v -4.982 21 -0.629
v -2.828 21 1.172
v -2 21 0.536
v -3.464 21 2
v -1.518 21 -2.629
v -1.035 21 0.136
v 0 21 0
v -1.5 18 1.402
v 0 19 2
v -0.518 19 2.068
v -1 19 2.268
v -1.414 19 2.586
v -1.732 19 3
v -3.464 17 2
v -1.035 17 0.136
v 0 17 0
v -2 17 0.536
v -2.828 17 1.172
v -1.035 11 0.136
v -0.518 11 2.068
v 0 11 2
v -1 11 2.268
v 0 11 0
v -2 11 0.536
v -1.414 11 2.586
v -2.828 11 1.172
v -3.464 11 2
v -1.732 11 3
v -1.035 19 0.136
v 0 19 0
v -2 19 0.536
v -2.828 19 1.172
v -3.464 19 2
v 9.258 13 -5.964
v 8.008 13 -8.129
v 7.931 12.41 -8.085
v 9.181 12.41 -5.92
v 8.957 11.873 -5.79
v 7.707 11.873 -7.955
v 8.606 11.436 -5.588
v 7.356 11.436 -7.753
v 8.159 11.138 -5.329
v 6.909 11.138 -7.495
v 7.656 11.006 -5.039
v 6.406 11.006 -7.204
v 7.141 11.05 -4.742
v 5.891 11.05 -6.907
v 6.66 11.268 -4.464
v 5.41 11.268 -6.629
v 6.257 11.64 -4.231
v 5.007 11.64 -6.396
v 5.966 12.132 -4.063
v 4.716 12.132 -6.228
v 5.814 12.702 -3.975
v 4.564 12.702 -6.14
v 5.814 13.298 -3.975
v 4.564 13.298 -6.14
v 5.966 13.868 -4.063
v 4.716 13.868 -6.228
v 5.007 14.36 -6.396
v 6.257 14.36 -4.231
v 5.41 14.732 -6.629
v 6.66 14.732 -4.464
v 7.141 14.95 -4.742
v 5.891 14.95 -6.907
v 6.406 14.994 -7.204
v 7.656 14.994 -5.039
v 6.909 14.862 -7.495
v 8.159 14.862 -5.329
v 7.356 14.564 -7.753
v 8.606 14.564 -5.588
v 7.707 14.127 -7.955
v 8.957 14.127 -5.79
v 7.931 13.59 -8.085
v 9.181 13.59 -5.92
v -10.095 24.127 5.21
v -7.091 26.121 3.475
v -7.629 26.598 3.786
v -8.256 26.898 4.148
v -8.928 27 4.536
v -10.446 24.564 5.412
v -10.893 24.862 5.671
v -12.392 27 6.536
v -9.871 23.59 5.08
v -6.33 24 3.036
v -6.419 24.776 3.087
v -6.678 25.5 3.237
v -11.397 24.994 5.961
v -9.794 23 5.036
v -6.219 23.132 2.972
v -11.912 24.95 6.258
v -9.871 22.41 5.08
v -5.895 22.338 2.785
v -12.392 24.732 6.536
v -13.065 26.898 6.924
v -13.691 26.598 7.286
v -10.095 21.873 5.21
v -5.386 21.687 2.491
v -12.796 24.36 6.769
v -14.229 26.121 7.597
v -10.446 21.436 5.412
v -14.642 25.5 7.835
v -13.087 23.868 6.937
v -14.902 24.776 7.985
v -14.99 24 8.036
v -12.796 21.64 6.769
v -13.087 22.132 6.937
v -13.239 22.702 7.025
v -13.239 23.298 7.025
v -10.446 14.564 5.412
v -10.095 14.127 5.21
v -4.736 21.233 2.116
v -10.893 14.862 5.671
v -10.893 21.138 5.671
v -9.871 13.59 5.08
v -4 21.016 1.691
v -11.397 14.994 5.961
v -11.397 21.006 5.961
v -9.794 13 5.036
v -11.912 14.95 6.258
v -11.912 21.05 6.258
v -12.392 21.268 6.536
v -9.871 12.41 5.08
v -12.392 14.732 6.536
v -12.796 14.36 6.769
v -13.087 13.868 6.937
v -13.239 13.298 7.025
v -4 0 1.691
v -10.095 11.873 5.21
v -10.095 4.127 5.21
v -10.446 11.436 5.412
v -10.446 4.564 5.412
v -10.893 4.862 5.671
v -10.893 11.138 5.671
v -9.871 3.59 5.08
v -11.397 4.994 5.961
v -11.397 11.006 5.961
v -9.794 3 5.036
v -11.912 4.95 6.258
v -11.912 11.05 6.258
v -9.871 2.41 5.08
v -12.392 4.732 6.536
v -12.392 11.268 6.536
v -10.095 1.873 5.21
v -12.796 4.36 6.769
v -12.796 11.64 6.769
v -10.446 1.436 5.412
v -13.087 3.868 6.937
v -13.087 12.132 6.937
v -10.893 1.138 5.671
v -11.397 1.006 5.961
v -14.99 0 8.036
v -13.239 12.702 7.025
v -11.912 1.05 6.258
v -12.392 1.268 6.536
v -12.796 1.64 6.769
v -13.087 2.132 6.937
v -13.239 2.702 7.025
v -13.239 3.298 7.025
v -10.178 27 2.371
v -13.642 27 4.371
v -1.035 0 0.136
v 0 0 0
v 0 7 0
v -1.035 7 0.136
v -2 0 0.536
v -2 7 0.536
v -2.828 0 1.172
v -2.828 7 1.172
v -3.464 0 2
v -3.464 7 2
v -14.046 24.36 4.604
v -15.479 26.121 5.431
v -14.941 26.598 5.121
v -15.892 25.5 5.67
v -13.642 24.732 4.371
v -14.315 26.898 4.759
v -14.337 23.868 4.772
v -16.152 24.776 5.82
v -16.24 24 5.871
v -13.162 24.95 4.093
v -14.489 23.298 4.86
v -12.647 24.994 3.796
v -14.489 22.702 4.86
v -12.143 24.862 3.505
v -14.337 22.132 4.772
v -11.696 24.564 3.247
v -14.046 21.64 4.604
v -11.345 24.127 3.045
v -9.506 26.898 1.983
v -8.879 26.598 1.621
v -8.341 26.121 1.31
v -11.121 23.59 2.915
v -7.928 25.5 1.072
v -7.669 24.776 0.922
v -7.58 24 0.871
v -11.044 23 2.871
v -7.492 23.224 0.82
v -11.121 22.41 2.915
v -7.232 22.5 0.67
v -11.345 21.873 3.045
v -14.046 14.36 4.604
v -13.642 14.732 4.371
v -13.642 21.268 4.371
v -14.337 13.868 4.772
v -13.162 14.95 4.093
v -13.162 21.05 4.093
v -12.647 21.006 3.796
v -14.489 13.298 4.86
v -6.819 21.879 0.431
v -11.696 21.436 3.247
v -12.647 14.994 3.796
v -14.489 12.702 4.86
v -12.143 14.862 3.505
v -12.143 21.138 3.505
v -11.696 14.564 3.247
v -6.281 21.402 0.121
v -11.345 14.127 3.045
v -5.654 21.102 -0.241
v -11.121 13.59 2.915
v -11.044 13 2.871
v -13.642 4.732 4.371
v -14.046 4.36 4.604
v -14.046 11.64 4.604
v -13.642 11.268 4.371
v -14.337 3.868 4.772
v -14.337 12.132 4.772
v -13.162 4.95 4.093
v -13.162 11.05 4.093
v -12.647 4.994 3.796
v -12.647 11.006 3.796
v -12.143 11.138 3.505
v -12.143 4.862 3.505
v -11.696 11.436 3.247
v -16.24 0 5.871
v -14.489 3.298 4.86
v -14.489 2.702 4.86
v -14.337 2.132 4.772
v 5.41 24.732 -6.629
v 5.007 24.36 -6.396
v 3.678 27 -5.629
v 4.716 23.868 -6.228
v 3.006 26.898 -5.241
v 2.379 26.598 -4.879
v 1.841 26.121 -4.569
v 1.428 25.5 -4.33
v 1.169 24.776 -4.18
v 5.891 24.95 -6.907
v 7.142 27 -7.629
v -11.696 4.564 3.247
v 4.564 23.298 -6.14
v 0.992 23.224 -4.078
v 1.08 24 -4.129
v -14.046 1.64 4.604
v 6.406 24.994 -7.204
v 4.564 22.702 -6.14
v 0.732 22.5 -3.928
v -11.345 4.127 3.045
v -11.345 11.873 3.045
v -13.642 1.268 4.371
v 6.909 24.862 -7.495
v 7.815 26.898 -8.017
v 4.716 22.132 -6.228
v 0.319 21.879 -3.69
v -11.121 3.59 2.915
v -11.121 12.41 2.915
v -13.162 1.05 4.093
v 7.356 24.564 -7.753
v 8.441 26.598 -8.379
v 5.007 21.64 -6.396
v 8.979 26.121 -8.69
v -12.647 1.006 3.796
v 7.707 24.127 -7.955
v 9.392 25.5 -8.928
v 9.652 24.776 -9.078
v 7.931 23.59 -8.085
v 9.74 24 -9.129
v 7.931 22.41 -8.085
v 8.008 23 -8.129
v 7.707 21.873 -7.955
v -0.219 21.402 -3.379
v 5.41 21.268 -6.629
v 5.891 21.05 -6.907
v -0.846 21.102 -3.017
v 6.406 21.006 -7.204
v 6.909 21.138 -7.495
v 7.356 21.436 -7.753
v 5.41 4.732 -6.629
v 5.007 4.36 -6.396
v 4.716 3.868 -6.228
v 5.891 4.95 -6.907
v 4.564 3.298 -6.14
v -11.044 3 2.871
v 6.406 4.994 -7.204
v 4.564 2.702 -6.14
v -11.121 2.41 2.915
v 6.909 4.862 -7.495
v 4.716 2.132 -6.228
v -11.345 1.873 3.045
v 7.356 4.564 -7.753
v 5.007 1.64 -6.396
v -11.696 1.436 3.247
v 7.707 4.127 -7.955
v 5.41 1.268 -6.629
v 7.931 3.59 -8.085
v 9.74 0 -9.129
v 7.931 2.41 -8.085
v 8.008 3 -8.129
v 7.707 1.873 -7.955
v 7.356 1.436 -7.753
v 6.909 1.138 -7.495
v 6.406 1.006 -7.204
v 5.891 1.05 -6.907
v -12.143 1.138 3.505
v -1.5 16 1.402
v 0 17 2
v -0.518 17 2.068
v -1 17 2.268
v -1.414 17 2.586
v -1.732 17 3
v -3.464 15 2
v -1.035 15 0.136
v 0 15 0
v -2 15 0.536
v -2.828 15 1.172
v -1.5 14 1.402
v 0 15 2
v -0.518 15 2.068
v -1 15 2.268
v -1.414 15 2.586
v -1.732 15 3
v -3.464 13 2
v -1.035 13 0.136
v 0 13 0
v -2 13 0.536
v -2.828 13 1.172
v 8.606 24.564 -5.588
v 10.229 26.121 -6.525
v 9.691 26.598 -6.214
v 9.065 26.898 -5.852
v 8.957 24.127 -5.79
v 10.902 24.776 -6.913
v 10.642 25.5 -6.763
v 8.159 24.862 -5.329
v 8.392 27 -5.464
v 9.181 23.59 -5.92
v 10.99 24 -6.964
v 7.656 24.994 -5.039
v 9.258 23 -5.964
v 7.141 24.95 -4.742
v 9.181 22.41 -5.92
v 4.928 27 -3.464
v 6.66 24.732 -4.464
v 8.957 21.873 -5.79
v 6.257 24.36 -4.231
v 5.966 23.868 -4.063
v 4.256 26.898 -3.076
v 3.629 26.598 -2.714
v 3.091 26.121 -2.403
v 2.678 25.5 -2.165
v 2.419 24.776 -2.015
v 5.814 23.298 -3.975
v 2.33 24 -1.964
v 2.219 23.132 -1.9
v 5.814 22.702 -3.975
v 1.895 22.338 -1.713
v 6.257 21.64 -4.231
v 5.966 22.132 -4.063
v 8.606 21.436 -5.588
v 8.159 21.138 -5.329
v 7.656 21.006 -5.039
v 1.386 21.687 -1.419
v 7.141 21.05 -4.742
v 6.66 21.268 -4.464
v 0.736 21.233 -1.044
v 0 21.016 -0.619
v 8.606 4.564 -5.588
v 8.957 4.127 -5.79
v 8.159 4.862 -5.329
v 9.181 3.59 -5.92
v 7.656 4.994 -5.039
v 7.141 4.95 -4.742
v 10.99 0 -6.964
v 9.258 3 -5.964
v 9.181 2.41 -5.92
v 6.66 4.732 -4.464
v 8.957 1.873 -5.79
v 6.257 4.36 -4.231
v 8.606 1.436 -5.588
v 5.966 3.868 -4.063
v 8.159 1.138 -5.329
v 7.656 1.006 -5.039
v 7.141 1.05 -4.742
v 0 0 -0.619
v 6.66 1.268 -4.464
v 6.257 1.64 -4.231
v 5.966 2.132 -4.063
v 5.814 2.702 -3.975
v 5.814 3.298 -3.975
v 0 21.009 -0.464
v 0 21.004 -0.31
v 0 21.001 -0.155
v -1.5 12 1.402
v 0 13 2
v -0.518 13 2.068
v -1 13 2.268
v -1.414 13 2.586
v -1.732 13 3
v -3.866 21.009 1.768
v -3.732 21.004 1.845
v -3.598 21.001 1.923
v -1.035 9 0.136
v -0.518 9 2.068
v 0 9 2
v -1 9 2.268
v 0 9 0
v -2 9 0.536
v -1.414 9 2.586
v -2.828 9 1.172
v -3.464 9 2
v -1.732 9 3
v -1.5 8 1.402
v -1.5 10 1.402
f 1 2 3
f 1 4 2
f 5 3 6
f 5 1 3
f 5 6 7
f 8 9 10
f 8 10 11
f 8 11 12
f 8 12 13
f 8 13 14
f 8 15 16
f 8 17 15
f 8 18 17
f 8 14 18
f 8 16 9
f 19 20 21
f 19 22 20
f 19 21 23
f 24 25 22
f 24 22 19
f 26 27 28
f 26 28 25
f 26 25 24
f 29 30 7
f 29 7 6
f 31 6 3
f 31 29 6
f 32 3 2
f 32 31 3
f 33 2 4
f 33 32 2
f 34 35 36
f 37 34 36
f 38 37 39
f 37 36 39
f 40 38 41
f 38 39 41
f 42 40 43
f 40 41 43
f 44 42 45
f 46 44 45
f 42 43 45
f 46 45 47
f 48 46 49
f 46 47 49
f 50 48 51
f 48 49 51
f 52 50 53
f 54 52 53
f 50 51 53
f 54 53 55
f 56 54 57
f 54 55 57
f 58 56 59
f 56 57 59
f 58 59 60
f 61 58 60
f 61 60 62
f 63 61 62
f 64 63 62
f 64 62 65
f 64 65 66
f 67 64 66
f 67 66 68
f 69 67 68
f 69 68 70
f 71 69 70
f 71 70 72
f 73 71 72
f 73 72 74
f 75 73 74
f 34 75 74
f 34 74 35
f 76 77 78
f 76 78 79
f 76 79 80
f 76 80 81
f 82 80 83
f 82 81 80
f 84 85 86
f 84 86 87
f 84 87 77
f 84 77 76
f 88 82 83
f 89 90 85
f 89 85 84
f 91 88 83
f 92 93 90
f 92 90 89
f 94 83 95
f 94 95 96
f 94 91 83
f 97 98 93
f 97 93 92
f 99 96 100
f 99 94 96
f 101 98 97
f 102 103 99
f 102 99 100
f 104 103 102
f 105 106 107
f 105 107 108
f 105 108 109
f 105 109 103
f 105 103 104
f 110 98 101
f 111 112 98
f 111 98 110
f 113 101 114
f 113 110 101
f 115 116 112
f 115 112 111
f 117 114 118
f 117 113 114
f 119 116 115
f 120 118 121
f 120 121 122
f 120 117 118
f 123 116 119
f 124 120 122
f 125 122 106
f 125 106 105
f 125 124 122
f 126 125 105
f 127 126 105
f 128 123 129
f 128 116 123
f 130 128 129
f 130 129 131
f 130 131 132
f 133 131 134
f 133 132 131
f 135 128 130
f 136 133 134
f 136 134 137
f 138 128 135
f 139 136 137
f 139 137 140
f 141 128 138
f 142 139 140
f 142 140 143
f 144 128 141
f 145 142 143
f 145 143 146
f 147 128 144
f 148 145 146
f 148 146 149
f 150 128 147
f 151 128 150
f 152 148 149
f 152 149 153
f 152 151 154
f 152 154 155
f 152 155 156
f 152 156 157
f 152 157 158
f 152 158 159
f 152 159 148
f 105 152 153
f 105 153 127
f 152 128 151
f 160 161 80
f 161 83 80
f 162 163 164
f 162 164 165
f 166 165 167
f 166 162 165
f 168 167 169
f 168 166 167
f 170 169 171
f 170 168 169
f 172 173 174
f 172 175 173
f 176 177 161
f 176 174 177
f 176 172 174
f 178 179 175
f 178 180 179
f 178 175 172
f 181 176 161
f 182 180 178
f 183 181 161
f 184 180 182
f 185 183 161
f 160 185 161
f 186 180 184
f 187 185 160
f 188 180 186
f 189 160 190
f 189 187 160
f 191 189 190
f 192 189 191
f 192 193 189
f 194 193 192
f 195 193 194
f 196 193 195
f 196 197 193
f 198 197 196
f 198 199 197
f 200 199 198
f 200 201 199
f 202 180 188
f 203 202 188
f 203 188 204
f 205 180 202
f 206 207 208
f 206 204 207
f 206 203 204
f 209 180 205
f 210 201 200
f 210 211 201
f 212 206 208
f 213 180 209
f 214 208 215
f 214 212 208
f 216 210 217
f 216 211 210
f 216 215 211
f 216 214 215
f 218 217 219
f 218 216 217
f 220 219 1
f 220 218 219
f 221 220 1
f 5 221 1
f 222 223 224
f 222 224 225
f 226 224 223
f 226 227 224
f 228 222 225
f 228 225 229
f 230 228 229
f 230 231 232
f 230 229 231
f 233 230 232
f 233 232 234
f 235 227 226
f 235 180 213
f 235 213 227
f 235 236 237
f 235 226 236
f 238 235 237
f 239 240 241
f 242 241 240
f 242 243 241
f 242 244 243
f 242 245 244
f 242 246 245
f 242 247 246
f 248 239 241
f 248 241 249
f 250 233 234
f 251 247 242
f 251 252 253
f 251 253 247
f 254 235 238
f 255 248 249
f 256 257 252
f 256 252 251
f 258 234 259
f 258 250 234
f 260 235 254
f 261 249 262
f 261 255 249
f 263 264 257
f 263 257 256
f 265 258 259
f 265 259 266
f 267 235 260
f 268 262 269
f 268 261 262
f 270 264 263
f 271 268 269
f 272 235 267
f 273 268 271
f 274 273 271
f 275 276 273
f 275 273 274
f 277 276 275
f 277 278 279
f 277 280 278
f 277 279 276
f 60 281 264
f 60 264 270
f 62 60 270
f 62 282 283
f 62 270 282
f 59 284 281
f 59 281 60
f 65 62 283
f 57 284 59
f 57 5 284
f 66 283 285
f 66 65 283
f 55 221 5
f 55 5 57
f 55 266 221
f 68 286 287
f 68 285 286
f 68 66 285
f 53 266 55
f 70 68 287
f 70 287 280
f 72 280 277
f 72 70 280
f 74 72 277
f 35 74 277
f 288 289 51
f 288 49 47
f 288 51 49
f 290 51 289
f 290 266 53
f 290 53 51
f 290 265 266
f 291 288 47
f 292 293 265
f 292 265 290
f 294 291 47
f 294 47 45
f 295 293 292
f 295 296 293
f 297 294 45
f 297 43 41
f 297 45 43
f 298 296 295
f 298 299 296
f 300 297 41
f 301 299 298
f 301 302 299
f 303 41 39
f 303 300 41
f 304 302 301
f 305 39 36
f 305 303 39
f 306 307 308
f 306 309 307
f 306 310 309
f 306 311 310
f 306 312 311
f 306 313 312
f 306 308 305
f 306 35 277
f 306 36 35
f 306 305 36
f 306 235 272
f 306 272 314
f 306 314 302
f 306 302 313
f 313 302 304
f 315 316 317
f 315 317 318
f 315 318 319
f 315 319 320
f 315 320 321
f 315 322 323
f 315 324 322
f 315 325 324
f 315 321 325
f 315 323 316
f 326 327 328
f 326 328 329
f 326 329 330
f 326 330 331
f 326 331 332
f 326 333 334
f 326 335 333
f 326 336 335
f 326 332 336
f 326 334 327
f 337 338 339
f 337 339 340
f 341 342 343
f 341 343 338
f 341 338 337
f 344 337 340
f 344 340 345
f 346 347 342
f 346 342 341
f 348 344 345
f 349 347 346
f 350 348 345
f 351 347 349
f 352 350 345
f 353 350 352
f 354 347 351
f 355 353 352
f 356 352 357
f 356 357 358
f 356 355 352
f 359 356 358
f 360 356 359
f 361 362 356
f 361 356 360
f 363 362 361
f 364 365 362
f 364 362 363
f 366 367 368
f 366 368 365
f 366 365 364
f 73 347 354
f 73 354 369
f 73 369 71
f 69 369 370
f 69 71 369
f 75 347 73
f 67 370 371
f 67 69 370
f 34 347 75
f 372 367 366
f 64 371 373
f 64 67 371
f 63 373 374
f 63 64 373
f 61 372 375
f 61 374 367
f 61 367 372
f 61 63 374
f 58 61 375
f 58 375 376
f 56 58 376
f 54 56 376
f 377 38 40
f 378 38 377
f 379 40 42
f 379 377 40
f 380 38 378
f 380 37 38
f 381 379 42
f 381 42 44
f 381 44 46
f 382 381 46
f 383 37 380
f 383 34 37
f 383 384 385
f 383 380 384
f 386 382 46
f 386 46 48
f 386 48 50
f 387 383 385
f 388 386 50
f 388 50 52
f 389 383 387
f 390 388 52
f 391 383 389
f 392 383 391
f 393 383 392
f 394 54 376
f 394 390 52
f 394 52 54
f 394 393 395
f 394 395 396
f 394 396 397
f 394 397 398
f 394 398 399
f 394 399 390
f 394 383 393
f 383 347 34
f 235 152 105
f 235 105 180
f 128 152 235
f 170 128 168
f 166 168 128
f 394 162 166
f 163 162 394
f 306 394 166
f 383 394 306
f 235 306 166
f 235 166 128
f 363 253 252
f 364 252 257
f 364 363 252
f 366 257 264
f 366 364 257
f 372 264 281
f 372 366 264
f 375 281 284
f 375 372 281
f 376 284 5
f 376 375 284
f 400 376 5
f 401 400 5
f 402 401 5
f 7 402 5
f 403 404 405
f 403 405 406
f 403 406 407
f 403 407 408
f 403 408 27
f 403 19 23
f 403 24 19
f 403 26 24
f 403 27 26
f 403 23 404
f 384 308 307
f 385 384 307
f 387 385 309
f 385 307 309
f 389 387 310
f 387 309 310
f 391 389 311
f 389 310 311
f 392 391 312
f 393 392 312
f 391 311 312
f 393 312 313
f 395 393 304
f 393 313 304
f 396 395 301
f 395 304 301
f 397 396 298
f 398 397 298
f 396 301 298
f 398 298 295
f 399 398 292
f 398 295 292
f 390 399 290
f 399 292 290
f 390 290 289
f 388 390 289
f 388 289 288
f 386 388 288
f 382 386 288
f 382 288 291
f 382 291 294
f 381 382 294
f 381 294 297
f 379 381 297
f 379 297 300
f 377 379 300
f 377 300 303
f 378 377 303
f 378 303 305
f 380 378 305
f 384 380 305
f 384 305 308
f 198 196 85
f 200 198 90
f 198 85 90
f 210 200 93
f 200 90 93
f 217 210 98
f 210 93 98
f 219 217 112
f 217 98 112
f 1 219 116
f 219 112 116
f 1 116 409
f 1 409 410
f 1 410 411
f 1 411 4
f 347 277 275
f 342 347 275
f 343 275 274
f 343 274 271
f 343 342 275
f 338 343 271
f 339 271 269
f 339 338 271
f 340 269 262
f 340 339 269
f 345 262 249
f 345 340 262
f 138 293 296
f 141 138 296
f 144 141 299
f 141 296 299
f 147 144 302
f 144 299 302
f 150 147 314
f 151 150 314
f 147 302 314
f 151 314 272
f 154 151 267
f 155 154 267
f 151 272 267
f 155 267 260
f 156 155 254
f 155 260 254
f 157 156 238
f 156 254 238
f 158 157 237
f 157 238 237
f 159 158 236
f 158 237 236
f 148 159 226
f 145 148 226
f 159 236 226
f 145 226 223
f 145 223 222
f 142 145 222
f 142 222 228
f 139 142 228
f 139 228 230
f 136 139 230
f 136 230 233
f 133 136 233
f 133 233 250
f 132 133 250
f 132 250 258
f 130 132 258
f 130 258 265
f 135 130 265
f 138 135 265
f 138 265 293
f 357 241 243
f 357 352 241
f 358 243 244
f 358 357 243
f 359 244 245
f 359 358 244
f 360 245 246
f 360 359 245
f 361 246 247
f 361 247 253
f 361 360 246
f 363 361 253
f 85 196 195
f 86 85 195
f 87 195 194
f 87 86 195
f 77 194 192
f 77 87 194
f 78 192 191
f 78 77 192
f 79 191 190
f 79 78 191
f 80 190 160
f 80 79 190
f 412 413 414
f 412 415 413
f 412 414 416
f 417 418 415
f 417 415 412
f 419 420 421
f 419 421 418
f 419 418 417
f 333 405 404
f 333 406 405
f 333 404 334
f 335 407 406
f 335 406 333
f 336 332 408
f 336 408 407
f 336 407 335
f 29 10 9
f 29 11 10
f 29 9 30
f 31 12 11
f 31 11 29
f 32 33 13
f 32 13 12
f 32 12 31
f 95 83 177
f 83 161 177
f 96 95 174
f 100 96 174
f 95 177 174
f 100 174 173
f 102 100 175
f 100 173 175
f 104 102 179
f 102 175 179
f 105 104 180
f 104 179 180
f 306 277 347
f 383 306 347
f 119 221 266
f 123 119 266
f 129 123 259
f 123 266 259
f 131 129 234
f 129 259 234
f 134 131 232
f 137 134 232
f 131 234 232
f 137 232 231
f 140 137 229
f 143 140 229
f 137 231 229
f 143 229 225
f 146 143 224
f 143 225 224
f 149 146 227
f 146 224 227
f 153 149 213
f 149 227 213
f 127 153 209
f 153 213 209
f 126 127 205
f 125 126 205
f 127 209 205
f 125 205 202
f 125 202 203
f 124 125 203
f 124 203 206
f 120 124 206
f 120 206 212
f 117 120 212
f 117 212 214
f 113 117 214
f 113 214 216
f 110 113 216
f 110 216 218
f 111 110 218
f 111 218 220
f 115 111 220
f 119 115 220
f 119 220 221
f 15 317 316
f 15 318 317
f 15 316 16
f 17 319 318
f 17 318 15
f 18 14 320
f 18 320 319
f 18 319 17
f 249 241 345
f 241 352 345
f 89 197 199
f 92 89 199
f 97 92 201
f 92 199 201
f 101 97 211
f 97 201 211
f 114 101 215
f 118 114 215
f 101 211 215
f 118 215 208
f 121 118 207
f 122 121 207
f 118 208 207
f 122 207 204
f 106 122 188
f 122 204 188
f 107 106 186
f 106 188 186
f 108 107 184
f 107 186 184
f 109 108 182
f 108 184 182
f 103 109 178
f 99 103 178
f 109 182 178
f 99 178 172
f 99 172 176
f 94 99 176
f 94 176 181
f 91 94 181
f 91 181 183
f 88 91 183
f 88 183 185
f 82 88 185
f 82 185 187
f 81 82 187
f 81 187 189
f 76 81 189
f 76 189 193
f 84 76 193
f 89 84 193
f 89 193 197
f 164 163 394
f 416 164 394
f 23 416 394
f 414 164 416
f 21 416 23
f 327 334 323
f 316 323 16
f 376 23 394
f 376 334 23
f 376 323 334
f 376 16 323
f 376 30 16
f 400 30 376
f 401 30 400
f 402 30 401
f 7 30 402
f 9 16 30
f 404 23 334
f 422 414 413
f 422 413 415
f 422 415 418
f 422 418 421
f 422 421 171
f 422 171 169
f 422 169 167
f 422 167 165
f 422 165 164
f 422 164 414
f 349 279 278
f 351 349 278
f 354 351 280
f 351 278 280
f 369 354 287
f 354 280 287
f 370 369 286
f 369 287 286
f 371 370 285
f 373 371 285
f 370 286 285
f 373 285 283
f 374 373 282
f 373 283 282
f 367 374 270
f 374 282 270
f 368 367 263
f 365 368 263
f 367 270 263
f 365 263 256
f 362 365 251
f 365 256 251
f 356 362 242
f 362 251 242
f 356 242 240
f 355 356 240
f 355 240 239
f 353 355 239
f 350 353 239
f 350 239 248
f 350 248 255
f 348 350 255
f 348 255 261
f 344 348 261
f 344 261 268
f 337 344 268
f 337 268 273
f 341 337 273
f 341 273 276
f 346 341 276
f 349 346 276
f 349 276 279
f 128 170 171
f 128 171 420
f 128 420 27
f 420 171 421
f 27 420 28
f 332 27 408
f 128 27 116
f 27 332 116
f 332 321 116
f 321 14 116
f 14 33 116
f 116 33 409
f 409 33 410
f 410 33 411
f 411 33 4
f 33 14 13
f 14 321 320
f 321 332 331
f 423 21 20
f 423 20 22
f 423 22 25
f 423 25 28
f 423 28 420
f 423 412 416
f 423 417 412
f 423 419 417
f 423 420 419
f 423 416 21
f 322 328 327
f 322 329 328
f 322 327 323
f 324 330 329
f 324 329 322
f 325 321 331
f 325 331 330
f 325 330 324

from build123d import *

# Parameters (mm, degrees)
F1_ANGLE = 60
F3_DEPTH = 27
F4_R     = 2
F5_DEPTH = 15.4913810568
F6_W     = 10
F6_H     = 6
F7_DEPTH = 15.4913810568
F8_R     = 2.99999


# Not quite as in the source:
# - a fillet or chamfer is up to 0.001 mm smaller than in the source, because OpenCascade refuses the exact size


with BuildPart() as f1:
    # F0 (on Right) → F1 (revolve)
    with BuildSketch(Plane.YZ):
        Polygon((7, 0), (0, 0), (0, -2.5), (26, -2.5), (26, 0), (19, 0), (19, 2), (17, 0), (17, 2), (15, 0), (15, 2), (13, 0), (13, 2), (11, 0), (11, 2), (9, 0), (9, 2), align=None)
    revolve(axis=Axis((0, 13.3030909821, 4), (0, 1, 0)), revolution_arc=F1_ANGLE)

    # F2 (on face) → F3 (join)
    with BuildSketch(Plane.XZ):
        Polygon((10.9903810568, -6.9641016151), (-2, 0.5358983849), (-3.25, -1.6291651246), (9.7403810568, -9.1291651246), align=None)
        Polygon((-3.25, -1.6291651246), (-2, 0.5358983849), (-14.9903810568, 8.0358983849), (-16.2403810568, 5.8708348754), align=None)
    extrude(amount=-F3_DEPTH)

    # F4 (on face) → F5 (cut, through all)
    with BuildSketch(Plane(origin=(-1.5179491924, 0, -2.6291651246), x_dir=(0.8660254038, 0, -0.5), z_dir=(-0.5, 0, -0.8660254038))):
        with Locations((-13, -3)):
            Circle(F4_R)
        with Locations((9, -3)):
            Circle(F4_R)
        with Locations((-13, -13)):
            Circle(F4_R)
        with Locations((9, -13)):
            Circle(F4_R)
        with Locations((-13, -23)):
            Circle(F4_R)
        with Locations((9, -23)):
            Circle(F4_R)
    extrude(amount=-F5_DEPTH, mode=Mode.SUBTRACT)

    # F6 (on face) → F7 (cut, through all)
    with BuildSketch(Plane(origin=(-1.5179491924, 0, -2.6291651246), x_dir=(0.8660254038, 0, -0.5), z_dir=(-0.5, 0, -0.8660254038))):
        with Locations((-2, -24)):
            Rectangle(F6_W, F6_H)
    extrude(amount=-F7_DEPTH, mode=Mode.SUBTRACT)

    # F8 (radius 3 in the source; OpenCascade refuses exactly that, so slightly less here)
    f8_edges = [f1.edges().sort_by_distance(p)[0] for p in [
        (1.705127, 21, -3.046633),
        (1.705127, 27, -3.046633),
        (-6.955127, 27, 1.953367),
        (-6.955127, 21, 1.953367),
        (-15.615381, 27, 6.953367),
        (10.365381, 27, -8.046633),
    ]]
    fillet(f8_edges, radius=F8_R)


solid = f1.part
